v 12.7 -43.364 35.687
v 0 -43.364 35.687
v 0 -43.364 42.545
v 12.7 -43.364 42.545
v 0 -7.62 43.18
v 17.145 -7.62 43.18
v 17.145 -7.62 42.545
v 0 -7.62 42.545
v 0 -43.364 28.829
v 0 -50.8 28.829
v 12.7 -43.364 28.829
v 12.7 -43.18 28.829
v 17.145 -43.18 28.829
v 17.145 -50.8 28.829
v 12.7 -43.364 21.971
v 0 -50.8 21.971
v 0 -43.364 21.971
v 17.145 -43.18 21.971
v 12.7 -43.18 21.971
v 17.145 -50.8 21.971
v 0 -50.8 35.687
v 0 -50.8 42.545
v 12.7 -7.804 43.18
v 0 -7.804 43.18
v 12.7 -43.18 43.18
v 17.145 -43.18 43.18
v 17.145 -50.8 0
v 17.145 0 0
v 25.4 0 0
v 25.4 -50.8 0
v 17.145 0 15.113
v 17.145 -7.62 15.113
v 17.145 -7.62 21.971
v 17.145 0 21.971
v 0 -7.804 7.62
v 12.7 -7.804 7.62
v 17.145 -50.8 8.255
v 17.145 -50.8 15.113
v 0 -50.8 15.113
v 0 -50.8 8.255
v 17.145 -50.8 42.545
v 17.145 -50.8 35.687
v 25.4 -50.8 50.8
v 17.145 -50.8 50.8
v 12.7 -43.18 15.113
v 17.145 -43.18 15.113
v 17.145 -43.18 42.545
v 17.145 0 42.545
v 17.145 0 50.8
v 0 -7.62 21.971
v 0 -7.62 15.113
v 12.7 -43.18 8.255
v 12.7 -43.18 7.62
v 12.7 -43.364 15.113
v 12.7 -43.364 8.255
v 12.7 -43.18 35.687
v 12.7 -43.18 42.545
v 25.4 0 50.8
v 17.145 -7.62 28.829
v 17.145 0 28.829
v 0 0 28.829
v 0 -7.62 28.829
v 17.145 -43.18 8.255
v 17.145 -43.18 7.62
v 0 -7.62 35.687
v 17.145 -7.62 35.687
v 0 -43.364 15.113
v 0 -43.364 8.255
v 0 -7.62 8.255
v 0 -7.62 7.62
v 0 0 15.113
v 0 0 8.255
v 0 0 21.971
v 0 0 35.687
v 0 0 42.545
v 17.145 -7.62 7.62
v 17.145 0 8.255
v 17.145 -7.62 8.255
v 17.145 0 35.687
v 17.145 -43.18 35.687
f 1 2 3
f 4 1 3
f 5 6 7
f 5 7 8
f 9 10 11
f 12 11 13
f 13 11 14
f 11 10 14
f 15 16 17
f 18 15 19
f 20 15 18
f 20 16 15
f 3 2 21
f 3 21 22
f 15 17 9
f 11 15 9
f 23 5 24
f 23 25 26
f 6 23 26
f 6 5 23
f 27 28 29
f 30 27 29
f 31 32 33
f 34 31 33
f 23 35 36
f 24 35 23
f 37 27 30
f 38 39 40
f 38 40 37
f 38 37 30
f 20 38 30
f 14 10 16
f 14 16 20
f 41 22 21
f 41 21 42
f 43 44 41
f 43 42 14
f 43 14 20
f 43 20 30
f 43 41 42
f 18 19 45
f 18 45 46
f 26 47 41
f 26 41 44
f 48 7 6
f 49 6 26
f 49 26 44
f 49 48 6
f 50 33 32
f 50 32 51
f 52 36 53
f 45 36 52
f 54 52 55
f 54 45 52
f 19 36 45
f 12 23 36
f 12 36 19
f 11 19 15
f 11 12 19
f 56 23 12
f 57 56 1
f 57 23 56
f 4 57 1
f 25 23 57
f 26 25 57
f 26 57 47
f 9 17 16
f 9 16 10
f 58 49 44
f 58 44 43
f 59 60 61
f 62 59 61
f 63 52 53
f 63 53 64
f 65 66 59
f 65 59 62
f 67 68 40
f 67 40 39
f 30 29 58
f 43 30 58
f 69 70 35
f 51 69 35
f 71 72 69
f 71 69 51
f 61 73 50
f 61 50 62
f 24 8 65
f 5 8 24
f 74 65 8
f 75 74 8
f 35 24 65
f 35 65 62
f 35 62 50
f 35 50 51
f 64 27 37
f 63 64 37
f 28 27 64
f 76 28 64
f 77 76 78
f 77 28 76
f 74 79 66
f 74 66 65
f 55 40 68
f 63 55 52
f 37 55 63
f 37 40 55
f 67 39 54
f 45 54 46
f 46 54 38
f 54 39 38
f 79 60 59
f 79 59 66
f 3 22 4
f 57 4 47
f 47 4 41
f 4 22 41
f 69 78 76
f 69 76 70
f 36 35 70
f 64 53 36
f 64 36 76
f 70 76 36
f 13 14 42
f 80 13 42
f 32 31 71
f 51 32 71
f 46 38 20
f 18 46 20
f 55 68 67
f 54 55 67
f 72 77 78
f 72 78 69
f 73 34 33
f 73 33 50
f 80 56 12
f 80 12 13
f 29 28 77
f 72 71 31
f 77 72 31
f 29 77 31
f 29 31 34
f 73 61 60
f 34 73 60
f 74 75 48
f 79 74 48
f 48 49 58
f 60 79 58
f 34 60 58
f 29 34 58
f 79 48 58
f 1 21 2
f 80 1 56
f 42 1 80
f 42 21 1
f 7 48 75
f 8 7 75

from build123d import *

# Parameters (mm, degrees)
F0_W      = 25.4
F0_H      = 50.8
F1_DEPTH  = 50.8
F2_W      = 35.56
F2_H      = 35.56
F3_DEPTH  = 12.7
F4_W      = 17.145
F4_H      = 8.255
F4_H_2    = 6.858
F5_DEPTH  = 7.62
F6_W      = 17.145
F6_H      = 8.255
F6_H_2    = 6.858
F7_DEPTH  = 7.62
F8_W      = 17.145
F8_H      = 35.56
F9_DEPTH  = 7.62
F10_W     = 17.145
F10_H     = 35.56
F11_DEPTH = 7.62


with BuildPart() as f1:
    # F0 (on Front) → F1 (new body)
    with BuildSketch(Plane.XZ):
        with Locations((12.7, 25.4)):
            Rectangle(F0_W, F0_H)
    extrude(amount=F1_DEPTH)

    # F2 (on face) → F3 (cut)
    with BuildSketch(Plane(origin=(0, 0, 0), x_dir=(0, -1, 0), z_dir=(-1, 0, 0))):
        with Locations((25.584483, 25.4)):
            Rectangle(F2_W, F2_H)
    extrude(amount=-F3_DEPTH, mode=Mode.SUBTRACT)

    # F4 (on face) → F5 (cut)
    with BuildSketch(Plane(origin=(0, 0, 0), x_dir=(-1, 0, 0), z_dir=(0, 1, 0))):
        with Locations((-8.5725, 46.6725)):
            Rectangle(F4_W, F4_H)
        with Locations((-8.5725, 32.258)):
            Rectangle(F4_W, F4_H_2)
        with Locations((-8.5725, 18.542)):
            Rectangle(F4_W, F4_H_2)
        with Locations((-8.5725, 4.1275)):
            Rectangle(F4_W, F4_H)
    extrude(amount=-F5_DEPTH, mode=Mode.SUBTRACT)

    # F6 (on face) → F7 (cut)
    with BuildSketch(Plane.XZ.offset(50.8)):
        with Locations((8.5725, 46.6725)):
            Rectangle(F6_W, F6_H)
        with Locations((8.5725, 32.258)):
            Rectangle(F6_W, F6_H_2)
        with Locations((8.5725, 18.542)):
            Rectangle(F6_W, F6_H_2)
        with Locations((8.5725, 4.1275)):
            Rectangle(F6_W, F6_H)
    extrude(amount=-F7_DEPTH, mode=Mode.SUBTRACT)

    # F8 (on face) → F9 (cut)
    with BuildSketch(Plane.XY.offset(50.8)):
        with Locations((8.5725, -25.4)):
            Rectangle(F8_W, F8_H)
    extrude(amount=-F9_DEPTH, mode=Mode.SUBTRACT)

    # F10 (on face) → F11 (cut)
    with BuildSketch(Plane(origin=(0, 0, 0), x_dir=(1, 0, 0), z_dir=(0, 0, -1))):
        with Locations((8.5725, 25.4)):
            Rectangle(F10_W, F10_H)
    extrude(amount=-F11_DEPTH, mode=Mode.SUBTRACT)


solid = f1.part
